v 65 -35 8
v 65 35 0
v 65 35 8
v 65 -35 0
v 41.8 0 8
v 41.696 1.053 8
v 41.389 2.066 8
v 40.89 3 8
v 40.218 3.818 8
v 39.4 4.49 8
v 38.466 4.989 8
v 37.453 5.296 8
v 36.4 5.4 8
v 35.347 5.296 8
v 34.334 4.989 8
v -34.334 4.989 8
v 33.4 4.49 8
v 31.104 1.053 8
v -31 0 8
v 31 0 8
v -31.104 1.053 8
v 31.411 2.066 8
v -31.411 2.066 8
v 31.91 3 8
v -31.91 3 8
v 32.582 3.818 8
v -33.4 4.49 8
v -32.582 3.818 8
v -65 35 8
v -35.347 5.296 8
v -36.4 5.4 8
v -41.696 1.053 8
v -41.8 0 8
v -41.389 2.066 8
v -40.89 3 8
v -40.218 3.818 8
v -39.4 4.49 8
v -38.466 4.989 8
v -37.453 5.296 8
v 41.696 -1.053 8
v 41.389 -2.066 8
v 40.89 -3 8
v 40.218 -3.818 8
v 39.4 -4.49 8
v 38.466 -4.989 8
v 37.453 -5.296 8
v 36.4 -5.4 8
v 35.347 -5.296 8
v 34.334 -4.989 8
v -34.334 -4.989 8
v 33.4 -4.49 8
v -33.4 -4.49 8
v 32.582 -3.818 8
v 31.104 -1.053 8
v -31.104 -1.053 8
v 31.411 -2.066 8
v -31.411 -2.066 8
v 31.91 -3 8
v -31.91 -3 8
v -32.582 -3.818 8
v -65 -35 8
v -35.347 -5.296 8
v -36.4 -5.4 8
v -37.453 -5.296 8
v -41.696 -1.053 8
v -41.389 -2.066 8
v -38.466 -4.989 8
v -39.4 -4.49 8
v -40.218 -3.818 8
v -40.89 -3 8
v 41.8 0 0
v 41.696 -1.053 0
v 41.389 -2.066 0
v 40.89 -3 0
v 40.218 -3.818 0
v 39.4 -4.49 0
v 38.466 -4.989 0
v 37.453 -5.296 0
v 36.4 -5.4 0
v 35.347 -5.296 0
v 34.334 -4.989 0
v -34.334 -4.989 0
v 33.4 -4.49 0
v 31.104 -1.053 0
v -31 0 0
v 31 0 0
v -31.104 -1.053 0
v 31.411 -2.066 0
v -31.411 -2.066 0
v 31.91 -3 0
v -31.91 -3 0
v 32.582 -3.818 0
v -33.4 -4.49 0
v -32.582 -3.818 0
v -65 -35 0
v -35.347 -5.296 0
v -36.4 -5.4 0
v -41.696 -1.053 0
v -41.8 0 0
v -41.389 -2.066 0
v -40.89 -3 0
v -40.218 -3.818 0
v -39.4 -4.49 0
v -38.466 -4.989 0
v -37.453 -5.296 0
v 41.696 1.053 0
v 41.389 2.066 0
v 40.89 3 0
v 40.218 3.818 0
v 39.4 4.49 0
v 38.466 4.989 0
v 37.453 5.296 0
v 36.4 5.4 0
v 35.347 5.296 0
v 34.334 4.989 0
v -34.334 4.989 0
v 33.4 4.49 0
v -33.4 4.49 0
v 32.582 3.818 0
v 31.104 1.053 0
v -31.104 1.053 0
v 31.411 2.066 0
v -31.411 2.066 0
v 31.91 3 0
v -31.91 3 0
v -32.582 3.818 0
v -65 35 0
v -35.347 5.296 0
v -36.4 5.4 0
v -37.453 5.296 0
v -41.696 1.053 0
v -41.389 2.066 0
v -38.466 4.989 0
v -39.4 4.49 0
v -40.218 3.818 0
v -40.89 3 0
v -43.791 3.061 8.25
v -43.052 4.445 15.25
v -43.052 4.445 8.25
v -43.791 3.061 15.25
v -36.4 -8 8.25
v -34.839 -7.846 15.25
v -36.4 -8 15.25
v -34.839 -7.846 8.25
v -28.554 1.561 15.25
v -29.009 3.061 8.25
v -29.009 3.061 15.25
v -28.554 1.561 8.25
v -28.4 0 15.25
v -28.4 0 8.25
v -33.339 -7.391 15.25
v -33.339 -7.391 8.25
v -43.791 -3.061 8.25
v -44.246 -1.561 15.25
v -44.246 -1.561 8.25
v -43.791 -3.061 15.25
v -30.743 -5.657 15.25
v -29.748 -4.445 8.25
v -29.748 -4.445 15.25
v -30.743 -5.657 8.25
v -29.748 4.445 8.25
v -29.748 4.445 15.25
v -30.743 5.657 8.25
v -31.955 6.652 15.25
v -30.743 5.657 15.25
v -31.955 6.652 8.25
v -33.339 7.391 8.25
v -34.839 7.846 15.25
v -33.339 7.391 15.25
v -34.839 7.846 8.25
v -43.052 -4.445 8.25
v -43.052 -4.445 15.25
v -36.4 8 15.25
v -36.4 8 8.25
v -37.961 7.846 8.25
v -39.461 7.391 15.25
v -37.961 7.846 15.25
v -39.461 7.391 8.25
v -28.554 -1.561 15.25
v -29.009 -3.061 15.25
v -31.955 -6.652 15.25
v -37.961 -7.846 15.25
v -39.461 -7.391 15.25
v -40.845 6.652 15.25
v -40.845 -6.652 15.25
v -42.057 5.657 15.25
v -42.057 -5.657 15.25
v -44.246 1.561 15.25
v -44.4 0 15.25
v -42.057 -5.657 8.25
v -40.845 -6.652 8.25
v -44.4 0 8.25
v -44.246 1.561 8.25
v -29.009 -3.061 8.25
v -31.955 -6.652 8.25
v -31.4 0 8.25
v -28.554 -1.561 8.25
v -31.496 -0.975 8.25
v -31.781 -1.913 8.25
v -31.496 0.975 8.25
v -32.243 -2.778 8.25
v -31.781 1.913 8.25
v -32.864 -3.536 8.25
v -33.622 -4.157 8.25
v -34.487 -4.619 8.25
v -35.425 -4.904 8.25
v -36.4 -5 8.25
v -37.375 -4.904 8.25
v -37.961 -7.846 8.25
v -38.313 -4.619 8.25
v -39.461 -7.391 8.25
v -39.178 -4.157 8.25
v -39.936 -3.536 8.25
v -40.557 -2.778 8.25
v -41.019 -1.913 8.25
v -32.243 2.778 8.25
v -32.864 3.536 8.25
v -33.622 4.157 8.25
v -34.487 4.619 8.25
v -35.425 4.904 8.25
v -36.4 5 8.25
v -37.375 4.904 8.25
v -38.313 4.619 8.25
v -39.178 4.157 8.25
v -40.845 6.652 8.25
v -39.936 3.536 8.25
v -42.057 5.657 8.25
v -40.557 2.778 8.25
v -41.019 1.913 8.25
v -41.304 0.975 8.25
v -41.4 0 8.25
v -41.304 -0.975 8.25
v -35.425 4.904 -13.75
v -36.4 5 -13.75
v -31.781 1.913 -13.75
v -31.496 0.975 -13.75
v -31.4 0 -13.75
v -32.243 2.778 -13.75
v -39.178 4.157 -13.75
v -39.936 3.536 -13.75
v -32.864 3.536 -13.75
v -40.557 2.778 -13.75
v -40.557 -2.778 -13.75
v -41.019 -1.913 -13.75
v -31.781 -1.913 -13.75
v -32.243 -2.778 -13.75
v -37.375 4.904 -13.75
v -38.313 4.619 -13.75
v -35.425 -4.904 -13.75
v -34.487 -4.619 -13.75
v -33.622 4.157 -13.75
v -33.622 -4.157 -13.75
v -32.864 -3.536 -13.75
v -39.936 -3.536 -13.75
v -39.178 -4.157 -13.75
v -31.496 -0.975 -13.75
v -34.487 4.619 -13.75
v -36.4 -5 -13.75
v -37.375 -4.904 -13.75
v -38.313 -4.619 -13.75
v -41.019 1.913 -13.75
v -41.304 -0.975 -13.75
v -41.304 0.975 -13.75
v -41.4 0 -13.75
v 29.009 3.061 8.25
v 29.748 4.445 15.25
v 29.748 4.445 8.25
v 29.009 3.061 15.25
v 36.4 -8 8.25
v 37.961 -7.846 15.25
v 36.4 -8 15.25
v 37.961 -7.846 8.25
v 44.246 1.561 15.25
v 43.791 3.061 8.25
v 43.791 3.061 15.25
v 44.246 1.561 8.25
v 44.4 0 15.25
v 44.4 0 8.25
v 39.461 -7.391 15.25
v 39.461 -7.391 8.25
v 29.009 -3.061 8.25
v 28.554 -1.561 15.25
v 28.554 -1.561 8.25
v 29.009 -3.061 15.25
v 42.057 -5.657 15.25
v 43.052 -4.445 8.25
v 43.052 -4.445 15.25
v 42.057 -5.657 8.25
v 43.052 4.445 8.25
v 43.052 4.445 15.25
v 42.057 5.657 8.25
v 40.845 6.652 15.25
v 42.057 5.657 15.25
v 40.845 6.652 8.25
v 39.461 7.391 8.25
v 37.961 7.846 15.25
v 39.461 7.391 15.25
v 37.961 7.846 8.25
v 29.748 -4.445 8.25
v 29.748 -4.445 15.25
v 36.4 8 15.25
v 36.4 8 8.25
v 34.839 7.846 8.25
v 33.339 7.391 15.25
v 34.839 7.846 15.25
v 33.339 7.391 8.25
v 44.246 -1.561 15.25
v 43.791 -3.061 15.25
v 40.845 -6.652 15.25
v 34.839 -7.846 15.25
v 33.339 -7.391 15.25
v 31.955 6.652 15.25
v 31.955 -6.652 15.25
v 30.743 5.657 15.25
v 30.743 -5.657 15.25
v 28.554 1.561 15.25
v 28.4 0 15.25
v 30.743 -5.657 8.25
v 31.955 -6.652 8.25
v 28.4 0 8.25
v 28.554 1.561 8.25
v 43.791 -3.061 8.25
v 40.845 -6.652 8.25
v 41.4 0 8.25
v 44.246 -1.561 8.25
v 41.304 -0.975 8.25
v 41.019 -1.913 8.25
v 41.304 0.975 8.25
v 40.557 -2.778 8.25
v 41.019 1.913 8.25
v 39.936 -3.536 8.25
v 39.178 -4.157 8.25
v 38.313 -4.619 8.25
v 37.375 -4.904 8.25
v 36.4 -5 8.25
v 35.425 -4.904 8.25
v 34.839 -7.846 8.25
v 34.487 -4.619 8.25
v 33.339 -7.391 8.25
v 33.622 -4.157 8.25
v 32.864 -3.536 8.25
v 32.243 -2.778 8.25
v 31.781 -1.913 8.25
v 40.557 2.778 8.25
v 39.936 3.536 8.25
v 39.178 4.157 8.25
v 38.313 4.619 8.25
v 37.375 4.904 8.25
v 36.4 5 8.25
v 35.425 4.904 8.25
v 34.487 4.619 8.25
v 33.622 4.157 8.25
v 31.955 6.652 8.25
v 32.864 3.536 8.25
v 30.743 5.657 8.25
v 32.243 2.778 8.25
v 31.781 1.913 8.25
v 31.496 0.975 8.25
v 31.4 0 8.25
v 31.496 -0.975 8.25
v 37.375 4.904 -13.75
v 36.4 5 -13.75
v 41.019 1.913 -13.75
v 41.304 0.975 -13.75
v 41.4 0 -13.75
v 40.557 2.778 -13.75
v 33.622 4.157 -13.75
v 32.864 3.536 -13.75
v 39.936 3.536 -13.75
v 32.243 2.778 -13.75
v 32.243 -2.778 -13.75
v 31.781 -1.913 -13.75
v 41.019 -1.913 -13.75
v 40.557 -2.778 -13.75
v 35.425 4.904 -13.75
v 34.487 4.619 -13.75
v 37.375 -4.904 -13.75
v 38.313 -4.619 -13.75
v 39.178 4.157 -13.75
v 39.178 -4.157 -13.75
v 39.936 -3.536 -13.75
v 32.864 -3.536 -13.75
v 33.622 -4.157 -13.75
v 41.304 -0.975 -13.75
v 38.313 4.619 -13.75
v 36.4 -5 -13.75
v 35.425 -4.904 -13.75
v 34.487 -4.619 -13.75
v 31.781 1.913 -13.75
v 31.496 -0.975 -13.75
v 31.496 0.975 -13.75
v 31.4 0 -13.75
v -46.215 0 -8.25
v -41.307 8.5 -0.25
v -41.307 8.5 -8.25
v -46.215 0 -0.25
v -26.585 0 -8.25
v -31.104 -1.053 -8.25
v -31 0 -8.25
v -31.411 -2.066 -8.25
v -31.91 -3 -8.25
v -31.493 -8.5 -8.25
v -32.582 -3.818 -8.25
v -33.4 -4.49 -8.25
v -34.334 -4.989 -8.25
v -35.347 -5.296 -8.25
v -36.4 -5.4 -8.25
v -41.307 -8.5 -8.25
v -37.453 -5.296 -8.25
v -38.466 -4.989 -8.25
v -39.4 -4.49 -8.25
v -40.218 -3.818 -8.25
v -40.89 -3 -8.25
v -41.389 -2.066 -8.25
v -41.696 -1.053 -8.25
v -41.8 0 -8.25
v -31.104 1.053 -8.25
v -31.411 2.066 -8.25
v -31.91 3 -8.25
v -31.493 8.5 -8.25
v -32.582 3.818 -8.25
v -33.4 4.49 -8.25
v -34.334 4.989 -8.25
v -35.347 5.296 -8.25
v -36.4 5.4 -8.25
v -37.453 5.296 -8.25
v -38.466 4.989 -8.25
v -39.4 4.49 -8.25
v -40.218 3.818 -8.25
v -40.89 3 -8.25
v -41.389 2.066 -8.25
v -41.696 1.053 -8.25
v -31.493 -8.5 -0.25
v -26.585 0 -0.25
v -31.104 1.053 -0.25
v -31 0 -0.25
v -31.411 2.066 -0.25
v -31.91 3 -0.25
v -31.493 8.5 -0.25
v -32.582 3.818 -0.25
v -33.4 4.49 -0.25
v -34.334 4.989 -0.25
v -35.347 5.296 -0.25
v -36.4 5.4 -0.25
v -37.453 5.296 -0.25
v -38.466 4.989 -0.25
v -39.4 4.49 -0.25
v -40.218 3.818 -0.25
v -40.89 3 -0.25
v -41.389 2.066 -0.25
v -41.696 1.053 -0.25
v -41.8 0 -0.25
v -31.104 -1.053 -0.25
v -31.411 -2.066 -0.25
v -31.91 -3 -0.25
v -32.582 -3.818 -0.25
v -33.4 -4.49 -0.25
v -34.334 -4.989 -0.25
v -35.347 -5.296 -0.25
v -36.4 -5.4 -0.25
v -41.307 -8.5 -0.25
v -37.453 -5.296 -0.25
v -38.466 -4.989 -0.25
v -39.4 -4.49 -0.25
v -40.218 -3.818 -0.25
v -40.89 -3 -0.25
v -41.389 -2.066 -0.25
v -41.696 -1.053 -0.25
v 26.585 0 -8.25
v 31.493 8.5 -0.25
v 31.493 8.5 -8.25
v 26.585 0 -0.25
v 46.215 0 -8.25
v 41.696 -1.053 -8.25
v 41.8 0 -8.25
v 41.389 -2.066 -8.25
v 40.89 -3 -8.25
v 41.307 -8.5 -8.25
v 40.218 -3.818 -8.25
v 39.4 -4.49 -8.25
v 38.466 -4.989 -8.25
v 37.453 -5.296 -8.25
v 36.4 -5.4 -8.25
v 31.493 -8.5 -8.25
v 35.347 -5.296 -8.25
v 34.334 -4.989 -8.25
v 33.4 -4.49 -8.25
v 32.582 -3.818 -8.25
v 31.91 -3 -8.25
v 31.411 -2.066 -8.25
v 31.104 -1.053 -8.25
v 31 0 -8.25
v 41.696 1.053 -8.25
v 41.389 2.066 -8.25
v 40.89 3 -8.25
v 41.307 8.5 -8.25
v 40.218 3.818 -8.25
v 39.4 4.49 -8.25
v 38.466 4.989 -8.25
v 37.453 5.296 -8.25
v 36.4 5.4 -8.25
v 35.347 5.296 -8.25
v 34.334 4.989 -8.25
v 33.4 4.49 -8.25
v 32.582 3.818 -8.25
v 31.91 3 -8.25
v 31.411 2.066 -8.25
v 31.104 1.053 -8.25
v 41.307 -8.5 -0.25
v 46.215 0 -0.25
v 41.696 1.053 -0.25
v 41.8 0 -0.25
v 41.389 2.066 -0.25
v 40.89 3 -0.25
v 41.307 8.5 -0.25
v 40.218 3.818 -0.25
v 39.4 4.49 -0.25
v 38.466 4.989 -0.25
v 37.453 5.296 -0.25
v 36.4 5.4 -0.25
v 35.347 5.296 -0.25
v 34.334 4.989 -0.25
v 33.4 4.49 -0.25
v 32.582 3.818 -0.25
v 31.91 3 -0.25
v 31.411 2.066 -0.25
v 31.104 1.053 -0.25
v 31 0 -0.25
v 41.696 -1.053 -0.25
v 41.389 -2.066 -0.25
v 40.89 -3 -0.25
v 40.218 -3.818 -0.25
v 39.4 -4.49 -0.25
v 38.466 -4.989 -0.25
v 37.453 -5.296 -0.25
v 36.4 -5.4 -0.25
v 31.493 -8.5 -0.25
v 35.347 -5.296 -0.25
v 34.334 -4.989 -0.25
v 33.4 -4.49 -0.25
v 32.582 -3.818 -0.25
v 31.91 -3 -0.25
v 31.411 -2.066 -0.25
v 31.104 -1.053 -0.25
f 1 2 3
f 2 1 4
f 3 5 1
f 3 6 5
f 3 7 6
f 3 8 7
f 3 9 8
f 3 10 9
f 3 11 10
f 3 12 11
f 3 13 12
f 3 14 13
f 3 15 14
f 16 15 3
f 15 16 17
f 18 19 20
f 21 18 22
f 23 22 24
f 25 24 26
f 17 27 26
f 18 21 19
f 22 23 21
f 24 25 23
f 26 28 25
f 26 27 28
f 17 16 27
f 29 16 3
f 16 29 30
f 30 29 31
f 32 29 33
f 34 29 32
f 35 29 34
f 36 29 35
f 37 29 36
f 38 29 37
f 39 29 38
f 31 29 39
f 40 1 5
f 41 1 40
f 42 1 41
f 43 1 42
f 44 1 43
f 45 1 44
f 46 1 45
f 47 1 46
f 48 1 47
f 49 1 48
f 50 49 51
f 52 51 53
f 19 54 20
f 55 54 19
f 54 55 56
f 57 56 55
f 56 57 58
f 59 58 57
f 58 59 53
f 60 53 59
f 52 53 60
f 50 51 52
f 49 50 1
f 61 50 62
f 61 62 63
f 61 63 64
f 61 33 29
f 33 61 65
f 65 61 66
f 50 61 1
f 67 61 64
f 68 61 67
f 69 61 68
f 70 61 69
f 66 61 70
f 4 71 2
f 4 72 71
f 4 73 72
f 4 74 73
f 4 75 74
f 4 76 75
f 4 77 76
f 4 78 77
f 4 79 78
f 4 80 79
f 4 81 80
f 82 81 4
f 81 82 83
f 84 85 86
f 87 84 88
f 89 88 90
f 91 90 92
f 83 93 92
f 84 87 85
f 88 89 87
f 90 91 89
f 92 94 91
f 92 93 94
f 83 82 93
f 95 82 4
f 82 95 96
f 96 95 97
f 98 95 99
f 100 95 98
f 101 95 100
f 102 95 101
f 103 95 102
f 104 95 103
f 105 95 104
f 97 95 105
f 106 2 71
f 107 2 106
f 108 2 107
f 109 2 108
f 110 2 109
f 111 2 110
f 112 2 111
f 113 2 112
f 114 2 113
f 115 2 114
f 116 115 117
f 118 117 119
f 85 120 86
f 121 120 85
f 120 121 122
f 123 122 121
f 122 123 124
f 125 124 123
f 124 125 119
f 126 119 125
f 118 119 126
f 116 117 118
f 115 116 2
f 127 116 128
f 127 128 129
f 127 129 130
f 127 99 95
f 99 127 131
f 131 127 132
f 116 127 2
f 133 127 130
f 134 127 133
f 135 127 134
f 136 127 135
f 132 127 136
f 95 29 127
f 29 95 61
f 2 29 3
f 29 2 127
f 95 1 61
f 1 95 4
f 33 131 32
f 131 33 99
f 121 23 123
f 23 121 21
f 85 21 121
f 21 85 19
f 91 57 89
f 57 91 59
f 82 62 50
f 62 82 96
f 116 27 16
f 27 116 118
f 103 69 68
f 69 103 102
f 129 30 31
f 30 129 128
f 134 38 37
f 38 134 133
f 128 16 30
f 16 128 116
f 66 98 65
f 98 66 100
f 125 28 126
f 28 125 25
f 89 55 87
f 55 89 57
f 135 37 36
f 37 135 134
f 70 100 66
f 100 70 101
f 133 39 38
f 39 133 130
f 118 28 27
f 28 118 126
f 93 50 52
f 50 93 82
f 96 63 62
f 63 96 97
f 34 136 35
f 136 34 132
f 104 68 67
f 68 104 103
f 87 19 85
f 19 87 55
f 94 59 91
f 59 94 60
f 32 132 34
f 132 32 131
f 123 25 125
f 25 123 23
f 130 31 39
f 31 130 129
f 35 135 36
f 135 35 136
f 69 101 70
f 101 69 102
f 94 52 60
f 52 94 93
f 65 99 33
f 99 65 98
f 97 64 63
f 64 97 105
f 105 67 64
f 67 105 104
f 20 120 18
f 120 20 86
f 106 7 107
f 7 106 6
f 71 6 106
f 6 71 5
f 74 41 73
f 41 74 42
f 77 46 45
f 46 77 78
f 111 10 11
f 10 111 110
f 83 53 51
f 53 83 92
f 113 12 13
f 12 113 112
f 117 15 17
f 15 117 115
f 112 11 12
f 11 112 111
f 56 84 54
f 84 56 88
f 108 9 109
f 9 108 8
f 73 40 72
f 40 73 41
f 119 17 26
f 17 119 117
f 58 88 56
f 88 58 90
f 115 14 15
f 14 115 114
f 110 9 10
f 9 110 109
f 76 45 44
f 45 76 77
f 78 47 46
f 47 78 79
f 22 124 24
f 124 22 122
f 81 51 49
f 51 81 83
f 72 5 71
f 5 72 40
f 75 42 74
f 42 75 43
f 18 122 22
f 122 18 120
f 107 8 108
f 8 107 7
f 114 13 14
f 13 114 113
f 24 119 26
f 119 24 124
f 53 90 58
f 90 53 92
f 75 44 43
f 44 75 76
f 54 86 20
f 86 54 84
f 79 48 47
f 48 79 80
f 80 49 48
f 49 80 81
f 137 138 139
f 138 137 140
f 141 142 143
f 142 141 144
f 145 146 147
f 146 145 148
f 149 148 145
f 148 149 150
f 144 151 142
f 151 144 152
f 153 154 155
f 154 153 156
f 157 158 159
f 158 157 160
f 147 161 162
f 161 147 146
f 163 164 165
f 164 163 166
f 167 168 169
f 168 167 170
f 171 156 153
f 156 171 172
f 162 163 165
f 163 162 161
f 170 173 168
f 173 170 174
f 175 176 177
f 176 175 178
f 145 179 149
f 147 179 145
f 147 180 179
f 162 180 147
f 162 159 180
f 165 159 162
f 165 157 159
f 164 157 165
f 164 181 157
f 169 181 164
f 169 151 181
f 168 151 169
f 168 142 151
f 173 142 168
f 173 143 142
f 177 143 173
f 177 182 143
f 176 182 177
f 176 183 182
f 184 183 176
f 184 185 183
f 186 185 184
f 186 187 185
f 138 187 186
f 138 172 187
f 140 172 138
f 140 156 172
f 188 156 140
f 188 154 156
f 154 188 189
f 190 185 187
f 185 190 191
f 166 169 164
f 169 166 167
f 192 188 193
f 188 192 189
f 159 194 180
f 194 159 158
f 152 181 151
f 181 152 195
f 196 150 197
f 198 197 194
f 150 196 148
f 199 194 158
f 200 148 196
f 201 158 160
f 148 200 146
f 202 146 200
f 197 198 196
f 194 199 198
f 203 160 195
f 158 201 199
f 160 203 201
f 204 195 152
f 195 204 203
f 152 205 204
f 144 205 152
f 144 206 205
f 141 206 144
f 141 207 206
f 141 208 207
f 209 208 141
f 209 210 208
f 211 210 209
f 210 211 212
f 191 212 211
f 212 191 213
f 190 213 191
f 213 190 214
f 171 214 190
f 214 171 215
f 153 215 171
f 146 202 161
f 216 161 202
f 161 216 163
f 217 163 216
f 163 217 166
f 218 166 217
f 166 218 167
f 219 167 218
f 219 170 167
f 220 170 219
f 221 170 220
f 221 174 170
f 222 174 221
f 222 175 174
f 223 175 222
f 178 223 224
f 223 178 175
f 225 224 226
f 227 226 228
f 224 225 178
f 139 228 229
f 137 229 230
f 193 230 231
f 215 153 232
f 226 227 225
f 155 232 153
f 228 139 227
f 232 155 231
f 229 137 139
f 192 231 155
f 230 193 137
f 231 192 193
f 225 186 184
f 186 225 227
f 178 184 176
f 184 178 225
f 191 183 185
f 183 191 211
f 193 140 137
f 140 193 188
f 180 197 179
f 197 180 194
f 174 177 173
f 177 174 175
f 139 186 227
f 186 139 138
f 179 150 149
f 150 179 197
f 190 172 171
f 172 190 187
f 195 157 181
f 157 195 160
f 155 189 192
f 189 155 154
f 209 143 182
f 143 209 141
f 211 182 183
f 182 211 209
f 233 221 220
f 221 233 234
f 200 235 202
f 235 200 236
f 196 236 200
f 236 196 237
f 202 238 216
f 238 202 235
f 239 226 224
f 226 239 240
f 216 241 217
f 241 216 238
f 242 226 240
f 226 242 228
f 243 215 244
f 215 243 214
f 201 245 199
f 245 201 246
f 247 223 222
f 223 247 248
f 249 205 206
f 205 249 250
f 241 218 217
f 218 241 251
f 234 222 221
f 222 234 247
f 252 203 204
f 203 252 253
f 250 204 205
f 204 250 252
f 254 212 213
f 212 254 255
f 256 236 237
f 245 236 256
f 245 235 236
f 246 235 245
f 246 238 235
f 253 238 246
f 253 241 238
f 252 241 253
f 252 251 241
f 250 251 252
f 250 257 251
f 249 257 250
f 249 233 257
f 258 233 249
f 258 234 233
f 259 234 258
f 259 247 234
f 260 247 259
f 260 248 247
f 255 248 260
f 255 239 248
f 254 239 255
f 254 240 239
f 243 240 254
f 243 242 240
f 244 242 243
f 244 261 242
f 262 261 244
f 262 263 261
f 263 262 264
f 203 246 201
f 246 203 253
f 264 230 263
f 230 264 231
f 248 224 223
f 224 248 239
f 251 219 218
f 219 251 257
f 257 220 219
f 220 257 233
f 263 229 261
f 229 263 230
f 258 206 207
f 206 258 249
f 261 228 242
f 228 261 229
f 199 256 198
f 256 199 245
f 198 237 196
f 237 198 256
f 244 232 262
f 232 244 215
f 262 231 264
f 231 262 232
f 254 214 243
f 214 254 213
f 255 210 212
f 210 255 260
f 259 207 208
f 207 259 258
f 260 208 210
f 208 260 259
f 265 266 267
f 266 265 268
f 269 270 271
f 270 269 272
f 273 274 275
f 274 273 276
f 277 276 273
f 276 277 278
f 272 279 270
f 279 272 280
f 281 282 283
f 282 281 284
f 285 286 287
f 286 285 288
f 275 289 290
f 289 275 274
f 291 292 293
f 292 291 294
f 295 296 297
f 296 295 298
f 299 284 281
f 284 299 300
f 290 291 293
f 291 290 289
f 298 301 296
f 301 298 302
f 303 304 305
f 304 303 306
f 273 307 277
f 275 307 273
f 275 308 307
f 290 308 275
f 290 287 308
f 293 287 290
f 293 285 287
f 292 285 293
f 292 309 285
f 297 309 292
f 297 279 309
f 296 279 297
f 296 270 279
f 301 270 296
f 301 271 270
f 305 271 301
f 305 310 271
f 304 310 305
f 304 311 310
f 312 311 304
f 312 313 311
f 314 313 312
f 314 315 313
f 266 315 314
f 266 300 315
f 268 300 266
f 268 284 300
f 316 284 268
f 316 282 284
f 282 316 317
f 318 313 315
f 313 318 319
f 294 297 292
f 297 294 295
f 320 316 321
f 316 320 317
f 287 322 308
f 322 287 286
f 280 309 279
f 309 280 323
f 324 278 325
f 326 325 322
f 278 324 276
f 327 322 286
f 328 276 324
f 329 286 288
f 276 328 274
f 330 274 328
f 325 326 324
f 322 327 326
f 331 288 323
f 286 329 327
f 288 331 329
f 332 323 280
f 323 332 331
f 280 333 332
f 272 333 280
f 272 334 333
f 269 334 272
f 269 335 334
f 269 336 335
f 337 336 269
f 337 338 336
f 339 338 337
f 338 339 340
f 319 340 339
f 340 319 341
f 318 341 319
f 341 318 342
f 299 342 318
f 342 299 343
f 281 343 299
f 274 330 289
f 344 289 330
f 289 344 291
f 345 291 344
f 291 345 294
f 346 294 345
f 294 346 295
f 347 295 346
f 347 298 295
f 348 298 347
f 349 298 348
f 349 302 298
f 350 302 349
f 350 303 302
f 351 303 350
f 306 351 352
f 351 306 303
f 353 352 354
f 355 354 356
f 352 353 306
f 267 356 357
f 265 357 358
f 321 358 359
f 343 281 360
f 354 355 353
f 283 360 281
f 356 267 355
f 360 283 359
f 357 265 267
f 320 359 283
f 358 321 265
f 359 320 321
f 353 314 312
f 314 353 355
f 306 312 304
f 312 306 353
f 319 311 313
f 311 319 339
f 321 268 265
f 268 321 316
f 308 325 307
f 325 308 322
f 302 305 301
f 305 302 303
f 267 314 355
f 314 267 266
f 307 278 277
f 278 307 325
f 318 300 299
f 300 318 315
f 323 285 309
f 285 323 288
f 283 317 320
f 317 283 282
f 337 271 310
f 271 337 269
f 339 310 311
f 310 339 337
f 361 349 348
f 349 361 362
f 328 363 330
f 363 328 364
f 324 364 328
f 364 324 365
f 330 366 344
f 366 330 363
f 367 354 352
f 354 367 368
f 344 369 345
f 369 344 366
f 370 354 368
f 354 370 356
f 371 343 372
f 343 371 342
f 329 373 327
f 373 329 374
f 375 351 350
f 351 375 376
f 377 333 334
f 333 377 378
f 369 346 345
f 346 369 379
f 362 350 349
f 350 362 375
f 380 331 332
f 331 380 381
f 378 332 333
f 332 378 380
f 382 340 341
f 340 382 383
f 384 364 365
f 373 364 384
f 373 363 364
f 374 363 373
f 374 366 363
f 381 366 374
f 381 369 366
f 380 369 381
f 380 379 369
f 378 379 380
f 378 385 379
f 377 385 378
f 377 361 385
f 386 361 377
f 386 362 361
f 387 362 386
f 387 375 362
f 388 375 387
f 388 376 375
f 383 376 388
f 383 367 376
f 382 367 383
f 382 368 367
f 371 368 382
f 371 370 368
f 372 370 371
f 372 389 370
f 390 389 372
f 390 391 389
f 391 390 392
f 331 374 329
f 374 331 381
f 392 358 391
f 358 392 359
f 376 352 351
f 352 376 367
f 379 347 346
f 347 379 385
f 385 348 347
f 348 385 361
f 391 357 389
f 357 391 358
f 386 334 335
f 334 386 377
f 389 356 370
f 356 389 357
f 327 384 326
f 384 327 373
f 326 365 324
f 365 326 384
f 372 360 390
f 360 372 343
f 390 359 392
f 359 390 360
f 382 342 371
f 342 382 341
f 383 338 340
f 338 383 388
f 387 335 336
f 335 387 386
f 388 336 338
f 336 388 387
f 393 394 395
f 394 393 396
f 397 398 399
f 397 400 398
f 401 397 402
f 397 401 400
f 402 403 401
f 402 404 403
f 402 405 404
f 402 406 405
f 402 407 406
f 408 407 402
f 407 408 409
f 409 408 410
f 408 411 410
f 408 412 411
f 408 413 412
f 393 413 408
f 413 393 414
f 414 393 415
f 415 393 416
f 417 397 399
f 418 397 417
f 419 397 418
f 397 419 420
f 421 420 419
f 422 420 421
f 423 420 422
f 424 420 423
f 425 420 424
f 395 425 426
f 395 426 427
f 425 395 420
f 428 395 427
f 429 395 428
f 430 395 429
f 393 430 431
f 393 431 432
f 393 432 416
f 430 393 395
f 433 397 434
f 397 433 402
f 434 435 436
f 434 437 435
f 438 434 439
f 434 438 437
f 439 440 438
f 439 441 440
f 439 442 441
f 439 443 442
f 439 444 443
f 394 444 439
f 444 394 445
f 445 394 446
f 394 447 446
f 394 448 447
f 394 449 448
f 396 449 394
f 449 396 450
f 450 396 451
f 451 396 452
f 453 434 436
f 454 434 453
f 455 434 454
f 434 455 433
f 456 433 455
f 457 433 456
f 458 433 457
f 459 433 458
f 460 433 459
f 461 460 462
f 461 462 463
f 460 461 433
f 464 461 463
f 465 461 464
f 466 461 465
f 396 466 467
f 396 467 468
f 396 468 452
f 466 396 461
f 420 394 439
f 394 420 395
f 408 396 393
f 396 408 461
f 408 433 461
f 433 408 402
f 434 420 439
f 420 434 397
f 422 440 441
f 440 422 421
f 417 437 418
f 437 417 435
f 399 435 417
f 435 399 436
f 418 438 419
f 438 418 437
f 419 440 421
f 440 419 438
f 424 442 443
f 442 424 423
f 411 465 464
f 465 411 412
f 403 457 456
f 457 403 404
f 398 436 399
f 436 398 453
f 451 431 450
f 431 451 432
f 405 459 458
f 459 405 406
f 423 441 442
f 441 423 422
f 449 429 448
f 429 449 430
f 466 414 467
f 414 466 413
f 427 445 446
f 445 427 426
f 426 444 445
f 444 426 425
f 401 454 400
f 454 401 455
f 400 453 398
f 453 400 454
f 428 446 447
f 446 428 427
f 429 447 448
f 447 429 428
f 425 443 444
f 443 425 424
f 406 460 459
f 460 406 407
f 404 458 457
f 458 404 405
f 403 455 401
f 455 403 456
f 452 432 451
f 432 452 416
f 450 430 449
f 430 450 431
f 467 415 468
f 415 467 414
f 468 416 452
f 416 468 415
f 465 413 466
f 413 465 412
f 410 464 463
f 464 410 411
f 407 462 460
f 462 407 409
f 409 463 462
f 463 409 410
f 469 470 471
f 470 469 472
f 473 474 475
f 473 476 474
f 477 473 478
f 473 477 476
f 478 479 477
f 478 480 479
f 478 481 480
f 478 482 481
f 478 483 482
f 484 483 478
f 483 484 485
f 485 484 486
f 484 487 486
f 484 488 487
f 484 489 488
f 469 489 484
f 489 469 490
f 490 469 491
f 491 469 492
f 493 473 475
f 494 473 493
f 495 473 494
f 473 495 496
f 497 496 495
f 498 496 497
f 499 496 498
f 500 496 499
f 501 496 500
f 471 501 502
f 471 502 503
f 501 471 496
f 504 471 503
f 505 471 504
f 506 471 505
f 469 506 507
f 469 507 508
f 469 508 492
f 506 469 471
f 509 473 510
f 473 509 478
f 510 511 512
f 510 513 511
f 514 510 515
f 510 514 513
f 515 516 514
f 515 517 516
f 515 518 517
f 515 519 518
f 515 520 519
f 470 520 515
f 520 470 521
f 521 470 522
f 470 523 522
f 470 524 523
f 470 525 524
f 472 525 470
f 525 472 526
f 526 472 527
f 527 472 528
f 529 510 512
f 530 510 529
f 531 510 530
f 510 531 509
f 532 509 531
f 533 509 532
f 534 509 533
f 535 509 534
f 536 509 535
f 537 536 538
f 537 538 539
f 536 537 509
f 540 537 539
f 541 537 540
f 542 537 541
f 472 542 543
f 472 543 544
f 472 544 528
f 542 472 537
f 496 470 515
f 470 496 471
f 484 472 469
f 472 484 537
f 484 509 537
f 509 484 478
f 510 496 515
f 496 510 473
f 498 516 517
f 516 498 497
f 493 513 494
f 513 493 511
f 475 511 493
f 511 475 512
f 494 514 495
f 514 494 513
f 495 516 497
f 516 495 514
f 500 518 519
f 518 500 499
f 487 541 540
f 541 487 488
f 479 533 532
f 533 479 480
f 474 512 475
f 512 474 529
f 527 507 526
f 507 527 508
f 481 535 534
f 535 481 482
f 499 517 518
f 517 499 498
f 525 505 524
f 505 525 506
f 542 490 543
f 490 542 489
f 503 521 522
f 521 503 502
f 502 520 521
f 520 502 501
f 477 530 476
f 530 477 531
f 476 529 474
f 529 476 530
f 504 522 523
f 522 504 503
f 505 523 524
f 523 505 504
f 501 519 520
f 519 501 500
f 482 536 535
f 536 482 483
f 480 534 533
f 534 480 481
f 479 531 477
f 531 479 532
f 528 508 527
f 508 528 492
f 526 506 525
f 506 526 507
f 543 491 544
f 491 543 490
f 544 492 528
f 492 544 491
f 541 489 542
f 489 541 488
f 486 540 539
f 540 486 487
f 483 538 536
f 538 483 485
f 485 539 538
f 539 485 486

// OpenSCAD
$fn = 32;

// ------------------------------------------------------------------------
// Bolted plate: 130 x 70 x 8 mm plate, 2 fasteners
// Every part is its own module, assembly() places them once.
// ------------------------------------------------------------------------

// --- part 1 ---
module plate() {
  difference() {
    translate([-65, -35, 0]) cube([130, 70, 8]);
    translate([-36.4, 0, -1]) cylinder(h = 10, d = 10.8);
    translate([36.4, 0, -1]) cylinder(h = 10, d = 10.8);
  }
}

// --- part 2 ---
module bolt1() {
  cylinder(h = 7, d = 16);
  translate([0, 0, -22]) cylinder(h = 22, d = 10);
}

// --- part 3 ---
module bolt2() {
  cylinder(h = 7, d = 16);
  translate([0, 0, -22]) cylinder(h = 22, d = 10);
}

// --- part 4 ---
module nut1() {
  difference() {
    linear_extrude(height = 8) polygon(points = [[9.815, 0], [4.907, 8.5], [-4.907, 8.5], [-9.815, 0], [-4.907, -8.5], [4.907, -8.5]]);
    translate([0, 0, -1]) cylinder(h = 10, d = 10.8);
  }
}

// --- part 5 ---
module nut2() {
  difference() {
    linear_extrude(height = 8) polygon(points = [[9.815, 0], [4.907, 8.5], [-4.907, 8.5], [-9.815, 0], [-4.907, -8.5], [4.907, -8.5]]);
    translate([0, 0, -1]) cylinder(h = 10, d = 10.8);
  }
}

// --- assembly ---
module assembly() {
  translate([0, 0, 0]) rotate([0, 0, 0]) plate();
  translate([-36.4, 0, 8.25]) rotate([0, 0, 0]) bolt1();
  translate([36.4, 0, 8.25]) rotate([0, 0, 0]) bolt2();
  translate([-36.4, 0, -8.25]) rotate([0, 0, 0]) nut1();
  translate([36.4, 0, -8.25]) rotate([0, 0, 0]) nut2();
}

assembly();
